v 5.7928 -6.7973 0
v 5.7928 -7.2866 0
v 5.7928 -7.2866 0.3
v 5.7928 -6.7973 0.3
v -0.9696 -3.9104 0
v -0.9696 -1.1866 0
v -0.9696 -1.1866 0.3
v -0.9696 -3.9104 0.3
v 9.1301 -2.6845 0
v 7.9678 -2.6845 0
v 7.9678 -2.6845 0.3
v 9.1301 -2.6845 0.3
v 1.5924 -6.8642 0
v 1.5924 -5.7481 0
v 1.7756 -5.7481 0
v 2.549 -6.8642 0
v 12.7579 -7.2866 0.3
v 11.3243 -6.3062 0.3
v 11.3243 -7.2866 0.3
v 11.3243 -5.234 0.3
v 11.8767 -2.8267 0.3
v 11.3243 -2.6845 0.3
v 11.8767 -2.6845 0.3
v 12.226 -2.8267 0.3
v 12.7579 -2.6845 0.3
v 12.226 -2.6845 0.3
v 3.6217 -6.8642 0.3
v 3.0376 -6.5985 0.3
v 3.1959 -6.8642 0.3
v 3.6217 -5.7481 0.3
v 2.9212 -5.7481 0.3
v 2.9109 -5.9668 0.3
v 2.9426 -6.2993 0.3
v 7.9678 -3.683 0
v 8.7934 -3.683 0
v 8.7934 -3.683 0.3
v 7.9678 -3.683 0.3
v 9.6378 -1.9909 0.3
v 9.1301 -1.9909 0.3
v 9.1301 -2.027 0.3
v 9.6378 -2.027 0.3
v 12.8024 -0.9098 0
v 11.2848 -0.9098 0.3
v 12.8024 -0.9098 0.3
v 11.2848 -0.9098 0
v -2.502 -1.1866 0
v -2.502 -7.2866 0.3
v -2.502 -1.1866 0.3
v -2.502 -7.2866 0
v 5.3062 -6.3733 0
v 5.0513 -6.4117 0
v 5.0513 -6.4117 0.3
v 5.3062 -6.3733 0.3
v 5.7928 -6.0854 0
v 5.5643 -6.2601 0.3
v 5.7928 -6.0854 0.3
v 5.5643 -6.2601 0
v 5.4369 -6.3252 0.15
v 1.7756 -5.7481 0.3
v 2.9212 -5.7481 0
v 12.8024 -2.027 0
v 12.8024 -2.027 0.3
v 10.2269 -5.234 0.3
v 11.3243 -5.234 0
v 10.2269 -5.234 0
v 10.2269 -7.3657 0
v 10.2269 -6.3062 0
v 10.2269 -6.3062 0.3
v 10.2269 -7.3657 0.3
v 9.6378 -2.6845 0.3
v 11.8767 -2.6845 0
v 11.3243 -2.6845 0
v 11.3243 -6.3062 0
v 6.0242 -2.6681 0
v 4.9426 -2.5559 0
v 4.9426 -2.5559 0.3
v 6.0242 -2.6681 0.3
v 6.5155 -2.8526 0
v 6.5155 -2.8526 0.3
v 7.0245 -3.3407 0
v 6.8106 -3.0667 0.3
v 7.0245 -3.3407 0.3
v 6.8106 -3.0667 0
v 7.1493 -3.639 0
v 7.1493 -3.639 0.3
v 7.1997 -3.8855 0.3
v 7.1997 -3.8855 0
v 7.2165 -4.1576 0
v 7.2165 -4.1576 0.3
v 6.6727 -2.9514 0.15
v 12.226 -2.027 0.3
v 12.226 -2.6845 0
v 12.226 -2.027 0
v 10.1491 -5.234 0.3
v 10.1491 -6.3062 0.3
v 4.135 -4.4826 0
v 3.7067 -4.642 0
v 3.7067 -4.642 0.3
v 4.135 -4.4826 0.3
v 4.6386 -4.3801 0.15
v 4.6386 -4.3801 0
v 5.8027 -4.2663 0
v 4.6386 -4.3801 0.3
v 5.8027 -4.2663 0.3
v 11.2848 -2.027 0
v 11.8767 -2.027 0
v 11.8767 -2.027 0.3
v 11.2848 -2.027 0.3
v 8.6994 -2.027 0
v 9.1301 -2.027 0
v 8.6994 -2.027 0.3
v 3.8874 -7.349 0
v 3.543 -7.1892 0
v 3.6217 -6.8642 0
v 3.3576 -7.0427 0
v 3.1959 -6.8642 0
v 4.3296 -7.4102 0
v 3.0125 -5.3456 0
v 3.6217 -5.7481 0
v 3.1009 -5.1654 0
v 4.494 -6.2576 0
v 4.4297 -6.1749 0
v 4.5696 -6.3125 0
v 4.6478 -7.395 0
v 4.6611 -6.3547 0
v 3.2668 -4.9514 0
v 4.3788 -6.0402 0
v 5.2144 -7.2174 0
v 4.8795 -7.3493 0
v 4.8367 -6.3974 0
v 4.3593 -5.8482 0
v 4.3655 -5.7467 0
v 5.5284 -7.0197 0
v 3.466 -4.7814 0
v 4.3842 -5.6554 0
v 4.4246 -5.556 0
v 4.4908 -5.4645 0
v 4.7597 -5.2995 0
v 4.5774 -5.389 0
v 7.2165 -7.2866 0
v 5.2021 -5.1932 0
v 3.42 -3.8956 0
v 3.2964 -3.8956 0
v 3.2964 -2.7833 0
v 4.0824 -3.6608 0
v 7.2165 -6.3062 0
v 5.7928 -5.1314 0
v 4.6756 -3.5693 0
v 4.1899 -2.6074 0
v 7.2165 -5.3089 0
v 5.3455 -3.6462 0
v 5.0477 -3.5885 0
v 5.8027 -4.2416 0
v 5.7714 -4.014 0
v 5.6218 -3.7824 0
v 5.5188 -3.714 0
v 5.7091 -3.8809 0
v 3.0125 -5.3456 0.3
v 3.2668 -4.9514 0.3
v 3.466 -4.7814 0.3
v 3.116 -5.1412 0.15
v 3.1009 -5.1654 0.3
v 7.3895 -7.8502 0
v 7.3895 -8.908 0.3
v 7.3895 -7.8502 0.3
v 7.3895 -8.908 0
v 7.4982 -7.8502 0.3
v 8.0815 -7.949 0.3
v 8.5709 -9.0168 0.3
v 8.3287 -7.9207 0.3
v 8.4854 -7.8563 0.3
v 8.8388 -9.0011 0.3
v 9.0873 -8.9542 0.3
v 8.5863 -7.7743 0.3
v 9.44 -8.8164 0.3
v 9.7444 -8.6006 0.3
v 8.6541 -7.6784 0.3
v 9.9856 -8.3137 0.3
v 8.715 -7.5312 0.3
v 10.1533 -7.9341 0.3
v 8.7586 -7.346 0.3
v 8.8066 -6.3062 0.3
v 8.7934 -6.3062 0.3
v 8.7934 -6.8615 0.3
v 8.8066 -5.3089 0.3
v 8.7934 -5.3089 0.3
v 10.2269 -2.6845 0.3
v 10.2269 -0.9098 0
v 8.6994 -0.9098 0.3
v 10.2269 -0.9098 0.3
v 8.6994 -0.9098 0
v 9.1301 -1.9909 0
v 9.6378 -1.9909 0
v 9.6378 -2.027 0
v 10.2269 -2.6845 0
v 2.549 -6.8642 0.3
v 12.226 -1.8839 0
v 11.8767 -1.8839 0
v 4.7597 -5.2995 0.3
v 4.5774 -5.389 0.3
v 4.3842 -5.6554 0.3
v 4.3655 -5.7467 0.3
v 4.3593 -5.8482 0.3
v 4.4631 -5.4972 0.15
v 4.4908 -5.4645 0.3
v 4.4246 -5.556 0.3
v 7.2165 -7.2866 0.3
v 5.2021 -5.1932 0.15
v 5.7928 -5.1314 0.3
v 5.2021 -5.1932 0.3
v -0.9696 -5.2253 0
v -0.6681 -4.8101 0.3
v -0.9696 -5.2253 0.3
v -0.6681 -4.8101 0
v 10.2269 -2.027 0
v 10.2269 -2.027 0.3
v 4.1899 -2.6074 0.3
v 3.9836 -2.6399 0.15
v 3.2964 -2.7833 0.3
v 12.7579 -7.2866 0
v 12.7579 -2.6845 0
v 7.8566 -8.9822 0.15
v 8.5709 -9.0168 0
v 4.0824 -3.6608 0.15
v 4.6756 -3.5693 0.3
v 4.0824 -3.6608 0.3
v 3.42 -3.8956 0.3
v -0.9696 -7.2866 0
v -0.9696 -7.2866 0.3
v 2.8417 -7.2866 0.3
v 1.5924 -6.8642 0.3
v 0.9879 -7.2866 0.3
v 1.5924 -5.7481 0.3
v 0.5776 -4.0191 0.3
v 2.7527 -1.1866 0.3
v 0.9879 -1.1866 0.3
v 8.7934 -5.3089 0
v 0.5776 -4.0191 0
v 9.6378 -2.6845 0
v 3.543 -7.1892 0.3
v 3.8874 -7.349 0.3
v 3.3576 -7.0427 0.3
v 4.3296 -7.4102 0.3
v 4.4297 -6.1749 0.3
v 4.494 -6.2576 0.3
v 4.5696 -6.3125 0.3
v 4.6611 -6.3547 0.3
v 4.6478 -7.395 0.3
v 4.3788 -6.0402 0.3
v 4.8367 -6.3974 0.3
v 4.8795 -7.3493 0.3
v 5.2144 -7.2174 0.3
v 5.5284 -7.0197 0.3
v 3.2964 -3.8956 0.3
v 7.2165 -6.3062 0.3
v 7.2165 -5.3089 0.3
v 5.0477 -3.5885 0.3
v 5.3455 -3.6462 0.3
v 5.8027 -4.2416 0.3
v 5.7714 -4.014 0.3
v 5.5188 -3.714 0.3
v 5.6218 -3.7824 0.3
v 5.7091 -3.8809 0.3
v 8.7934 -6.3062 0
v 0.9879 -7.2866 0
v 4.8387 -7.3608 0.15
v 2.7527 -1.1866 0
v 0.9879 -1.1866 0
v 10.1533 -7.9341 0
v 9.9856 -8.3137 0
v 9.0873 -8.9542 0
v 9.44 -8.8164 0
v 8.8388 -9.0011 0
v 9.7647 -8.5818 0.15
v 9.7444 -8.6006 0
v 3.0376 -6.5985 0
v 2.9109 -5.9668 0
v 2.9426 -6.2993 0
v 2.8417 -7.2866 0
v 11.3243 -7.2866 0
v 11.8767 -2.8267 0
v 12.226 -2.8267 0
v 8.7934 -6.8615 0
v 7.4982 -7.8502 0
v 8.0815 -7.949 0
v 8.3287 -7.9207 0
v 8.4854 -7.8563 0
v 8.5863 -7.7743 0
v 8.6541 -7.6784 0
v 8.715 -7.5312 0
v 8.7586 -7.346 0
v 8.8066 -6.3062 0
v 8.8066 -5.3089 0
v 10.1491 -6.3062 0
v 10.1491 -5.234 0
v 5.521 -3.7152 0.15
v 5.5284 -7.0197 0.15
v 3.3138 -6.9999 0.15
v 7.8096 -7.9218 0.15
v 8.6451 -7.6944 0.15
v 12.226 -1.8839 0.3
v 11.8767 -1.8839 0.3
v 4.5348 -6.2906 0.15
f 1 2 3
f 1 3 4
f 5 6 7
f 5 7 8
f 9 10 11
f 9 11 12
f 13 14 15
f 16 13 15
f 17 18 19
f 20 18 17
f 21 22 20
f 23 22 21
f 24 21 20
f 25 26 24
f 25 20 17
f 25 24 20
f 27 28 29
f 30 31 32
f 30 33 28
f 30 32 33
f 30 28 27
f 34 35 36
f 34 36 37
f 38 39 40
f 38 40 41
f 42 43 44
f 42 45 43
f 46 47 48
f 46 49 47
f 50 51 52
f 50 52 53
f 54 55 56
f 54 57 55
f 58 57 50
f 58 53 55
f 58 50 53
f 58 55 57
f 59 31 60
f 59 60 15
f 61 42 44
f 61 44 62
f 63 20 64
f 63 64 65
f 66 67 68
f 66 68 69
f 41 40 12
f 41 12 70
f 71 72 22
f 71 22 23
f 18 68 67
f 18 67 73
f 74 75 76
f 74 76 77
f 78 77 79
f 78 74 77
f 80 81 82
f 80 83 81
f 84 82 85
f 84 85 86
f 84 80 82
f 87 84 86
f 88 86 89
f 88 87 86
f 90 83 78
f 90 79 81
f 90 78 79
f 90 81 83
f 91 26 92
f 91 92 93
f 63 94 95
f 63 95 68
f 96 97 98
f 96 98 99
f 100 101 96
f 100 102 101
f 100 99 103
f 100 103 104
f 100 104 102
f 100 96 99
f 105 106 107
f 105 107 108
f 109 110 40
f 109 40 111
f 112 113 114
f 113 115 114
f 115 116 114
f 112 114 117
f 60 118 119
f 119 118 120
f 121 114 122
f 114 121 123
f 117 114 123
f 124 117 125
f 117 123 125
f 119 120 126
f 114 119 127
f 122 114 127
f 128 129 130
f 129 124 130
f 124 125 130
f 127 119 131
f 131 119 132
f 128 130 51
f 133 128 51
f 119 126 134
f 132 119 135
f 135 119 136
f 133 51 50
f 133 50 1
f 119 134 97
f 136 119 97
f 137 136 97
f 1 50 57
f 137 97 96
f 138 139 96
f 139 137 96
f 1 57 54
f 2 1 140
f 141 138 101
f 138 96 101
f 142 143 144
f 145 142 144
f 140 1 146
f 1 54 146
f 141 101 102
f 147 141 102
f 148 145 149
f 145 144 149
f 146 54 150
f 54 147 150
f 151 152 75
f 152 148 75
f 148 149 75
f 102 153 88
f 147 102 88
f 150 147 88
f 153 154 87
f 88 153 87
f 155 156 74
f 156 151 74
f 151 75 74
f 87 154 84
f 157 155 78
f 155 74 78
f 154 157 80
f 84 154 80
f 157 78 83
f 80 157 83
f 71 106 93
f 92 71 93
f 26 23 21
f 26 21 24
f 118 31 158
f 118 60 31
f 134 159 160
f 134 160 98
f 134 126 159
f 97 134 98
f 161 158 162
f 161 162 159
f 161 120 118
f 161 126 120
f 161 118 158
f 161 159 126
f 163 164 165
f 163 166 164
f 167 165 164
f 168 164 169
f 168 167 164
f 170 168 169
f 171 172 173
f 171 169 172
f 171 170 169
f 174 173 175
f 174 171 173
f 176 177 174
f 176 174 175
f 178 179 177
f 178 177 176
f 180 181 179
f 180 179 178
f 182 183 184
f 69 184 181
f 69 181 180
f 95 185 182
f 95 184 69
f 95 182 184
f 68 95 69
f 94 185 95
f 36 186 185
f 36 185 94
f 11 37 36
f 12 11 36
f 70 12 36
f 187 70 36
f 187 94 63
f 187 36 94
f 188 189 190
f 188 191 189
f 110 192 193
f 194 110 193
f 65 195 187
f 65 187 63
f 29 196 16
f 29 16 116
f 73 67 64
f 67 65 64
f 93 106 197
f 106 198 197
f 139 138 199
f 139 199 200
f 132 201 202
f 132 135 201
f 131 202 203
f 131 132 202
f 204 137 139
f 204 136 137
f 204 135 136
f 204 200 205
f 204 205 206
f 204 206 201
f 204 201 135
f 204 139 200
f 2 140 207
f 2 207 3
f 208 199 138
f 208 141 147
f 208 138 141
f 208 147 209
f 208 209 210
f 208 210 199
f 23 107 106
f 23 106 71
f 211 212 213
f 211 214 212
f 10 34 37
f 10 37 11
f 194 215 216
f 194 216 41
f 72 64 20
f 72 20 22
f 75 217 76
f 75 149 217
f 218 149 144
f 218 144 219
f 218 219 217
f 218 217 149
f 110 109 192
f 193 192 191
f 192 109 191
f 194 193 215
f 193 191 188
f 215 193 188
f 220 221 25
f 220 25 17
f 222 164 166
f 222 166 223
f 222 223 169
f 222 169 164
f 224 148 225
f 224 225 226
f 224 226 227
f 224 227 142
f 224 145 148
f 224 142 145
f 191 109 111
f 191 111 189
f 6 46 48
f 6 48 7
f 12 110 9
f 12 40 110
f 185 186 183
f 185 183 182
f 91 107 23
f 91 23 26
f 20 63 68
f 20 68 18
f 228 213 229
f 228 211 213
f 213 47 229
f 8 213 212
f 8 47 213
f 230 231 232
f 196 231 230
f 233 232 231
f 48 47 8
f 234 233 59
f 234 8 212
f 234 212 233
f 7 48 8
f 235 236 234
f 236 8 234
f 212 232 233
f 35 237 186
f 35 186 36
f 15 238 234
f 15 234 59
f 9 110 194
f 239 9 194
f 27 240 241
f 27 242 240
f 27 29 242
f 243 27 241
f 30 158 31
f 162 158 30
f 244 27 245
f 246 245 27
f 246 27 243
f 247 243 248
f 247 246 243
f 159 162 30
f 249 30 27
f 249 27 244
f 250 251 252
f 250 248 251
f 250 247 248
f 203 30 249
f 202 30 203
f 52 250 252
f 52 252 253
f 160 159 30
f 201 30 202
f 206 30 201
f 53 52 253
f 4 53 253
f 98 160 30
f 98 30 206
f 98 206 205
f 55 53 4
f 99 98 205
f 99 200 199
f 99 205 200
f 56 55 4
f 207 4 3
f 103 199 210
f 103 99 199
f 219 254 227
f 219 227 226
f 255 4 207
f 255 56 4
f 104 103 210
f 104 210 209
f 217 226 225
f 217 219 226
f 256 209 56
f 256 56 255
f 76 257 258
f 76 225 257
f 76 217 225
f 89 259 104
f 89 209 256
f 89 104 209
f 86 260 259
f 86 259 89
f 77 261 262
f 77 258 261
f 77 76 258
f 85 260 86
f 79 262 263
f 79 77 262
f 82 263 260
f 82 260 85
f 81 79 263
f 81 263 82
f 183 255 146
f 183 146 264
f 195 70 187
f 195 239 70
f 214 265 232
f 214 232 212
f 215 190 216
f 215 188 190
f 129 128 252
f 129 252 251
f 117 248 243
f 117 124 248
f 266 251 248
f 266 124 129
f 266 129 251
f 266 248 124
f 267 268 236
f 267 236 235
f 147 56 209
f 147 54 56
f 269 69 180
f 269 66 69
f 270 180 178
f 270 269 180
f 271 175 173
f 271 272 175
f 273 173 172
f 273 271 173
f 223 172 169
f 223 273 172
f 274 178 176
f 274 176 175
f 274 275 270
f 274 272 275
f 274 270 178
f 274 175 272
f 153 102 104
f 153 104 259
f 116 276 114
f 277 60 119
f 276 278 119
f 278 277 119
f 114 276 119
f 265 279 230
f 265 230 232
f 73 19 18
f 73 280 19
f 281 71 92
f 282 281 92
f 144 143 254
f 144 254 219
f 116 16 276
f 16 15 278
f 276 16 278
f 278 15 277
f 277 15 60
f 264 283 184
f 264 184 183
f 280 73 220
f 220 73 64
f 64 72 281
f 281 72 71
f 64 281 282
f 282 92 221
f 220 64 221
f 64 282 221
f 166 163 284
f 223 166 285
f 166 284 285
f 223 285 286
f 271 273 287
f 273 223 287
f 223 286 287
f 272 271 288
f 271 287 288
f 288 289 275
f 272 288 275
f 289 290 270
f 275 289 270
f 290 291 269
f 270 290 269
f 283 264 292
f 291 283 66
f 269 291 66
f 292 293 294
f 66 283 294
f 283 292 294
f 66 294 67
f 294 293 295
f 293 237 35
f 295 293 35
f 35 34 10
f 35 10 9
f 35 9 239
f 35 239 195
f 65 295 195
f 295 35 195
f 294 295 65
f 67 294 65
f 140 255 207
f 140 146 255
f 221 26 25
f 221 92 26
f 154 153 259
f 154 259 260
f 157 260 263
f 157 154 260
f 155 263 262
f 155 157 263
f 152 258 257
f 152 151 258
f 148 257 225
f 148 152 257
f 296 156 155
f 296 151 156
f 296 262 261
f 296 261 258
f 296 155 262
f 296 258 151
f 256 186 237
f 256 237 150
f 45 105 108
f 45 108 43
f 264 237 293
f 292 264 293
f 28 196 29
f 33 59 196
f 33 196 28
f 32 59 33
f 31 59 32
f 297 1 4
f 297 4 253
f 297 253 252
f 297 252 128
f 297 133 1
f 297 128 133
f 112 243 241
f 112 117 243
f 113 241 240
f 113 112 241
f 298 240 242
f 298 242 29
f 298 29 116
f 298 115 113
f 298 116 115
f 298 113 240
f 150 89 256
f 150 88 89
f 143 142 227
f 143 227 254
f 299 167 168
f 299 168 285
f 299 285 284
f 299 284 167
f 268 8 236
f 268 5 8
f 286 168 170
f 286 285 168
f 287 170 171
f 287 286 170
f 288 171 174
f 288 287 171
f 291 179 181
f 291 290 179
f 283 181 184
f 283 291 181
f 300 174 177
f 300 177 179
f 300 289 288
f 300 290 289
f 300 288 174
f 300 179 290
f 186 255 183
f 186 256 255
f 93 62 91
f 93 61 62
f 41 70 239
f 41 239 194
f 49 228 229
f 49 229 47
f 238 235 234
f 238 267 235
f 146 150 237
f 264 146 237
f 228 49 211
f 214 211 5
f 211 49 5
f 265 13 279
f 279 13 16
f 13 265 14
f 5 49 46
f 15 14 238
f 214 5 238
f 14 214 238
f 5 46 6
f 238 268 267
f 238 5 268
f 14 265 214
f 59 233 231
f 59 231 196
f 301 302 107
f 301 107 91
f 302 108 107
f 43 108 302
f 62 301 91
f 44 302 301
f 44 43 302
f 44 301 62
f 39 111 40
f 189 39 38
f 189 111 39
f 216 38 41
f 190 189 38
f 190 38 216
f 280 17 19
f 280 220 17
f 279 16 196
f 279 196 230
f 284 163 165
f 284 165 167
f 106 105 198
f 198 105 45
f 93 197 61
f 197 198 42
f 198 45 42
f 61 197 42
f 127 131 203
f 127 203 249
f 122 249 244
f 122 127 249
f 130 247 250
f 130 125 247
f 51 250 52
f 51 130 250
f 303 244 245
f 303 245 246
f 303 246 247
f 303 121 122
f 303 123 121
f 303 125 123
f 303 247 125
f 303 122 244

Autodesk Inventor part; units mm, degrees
ref_plane "YZ Plane" through (0, 0, 0) normal (1, 0, 0) x (0, 1, 0)
ref_plane "XZ Plane" through (0, 0, 0) normal (0, 1, 0) x (-1, 0, 0)
sketch "スケッチ1" plane through (0, 0, 0) normal (0, 0, 1) x (1, 0, 0)
  line L0 (-3.1348, -0.9098) -> (10.2725, -0.9098) construction
  line L1 (10.2725, -0.9098) -> (10.2725, -4.9582) construction
  line L2 (10.2725, -4.9582) -> (-3.1348, -4.9582) construction
  line L3 (-3.1348, -4.9582) -> (-3.1348, -0.9098) construction
  line L4 (2.8417, -7.2866) -> (0.9879, -7.2866)
  line L5 (0.9879, -7.2866) -> (-0.6681, -4.8101)
  line L6 (-0.6681, -4.8101) -> (-0.9696, -5.2253)
  line L7 (-0.9696, -5.2253) -> (-0.9696, -7.2866)
  line L8 (-0.9696, -7.2866) -> (-2.502, -7.2866)
  line L9 (-2.502, -7.2866) -> (-2.502, -1.1866)
  line L10 (-2.502, -1.1866) -> (-0.9696, -1.1866)
  line L11 (-0.9696, -1.1866) -> (-0.9696, -3.9104)
  line L12 (-0.9696, -3.9104) -> (0.9879, -1.1866)
  line L13 (0.9879, -1.1866) -> (2.7527, -1.1866)
  line L14 (2.7527, -1.1866) -> (0.5776, -4.0191)
  line L15 (0.5776, -4.0191) -> (2.8417, -7.2866)
  spline S0 degree 2 poles (5.7928, -6.7973) (5.6445, -6.9208) (5.4122, -7.1186) (5.2144, -7.2174) knots 0 0 0 1 2 2 2
  spline S1 degree 2 poles (5.2144, -7.2174) (5.0216, -7.3114) (4.6558, -7.4102) (4.3296, -7.4102) knots 0 0 0 1 2 2 2
  spline S2 degree 2 poles (4.3296, -7.4102) (3.7166, -7.4102) (2.9109, -6.5896) (2.9109, -5.9668) knots 0 0 0 1 2 2 2
  spline S3 degree 2 poles (2.9109, -5.9668) (2.9109, -5.4576) (3.3212, -4.8249) (3.7067, -4.642) knots 0 0 0 1 2 2 2
  spline S4 degree 2 poles (3.7067, -4.642) (4.0973, -4.4542) (5.1798, -4.3059) (5.8027, -4.2663) knots 0 0 0 1 2 2 2
  line L16 (5.8027, -4.2663) -> (5.8027, -4.2416)
  spline S5 degree 2 poles (5.8027, -4.2416) (5.8027, -3.861) (5.2392, -3.5693) (4.6756, -3.5693) knots 0 0 0 1 2 2 2
  spline S6 degree 2 poles (4.6756, -3.5693) (4.4235, -3.5693) (3.7413, -3.7522) (3.42, -3.8956) knots 0 0 0 1 2 2 2
  line L17 (3.42, -3.8956) -> (3.2964, -3.8956)
  line L18 (3.2964, -3.8956) -> (3.2964, -2.7833)
  spline S7 degree 2 poles (3.2964, -2.7833) (3.509, -2.724) (4.4581, -2.5559) (4.9426, -2.5559) knots 0 0 0 1 2 2 2
  spline S8 degree 2 poles (4.9426, -2.5559) (6.1289, -2.5559) (7.2165, -3.3469) (7.2165, -4.1576) knots 0 0 0 1 2 2 2
  line L19 (7.2165, -4.1576) -> (7.2165, -7.2866)
  line L20 (7.2165, -7.2866) -> (5.7928, -7.2866)
  line L21 (5.7928, -7.2866) -> (5.7928, -6.7973)
  line L22 (5.7928, -6.0854) -> (5.7928, -5.1314)
  spline S9 degree 2 poles (5.7928, -5.1314) (5.427, -5.166) (4.9772, -5.2204) (4.7597, -5.2995) knots 0 0 0 1 2 2 2
  spline S10 degree 2 poles (4.7597, -5.2995) (4.5669, -5.3637) (4.3593, -5.6307) (4.3593, -5.8482) knots 0 0 0 1 2 2 2
  spline S11 degree 2 poles (4.3593, -5.8482) (4.3593, -6.1695) (4.7102, -6.4117) (5.0513, -6.4117) knots 0 0 0 1 2 2 2
  spline S12 degree 2 poles (5.0513, -6.4117) (5.2392, -6.4117) (5.6346, -6.2387) (5.7928, -6.0854) knots 0 0 0 1 2 2 2
  spline S13 degree 2 poles (10.2269, -7.3657) (10.2269, -8.1468) (9.3025, -9.0168) (8.5709, -9.0168) knots 0 0 0 1 2 2 2
  spline S14 degree 2 poles (8.5709, -9.0168) (8.1755, -9.0168) (7.5378, -8.9476) (7.3895, -8.908) knots 0 0 0 1 2 2 2
  line L23 (7.3895, -8.908) -> (7.3895, -7.8502)
  line L24 (7.3895, -7.8502) -> (7.4982, -7.8502)
  spline S15 degree 2 poles (7.4982, -7.8502) (7.6416, -7.8947) (7.9777, -7.949) (8.0815, -7.949) knots 0 0 0 1 2 2 2
  spline S16 degree 2 poles (8.0815, -7.949) (8.4968, -7.949) (8.7934, -7.4399) (8.7934, -6.8615) knots 0 0 0 1 2 2 2
  line L25 (8.7934, -6.8615) -> (8.7934, -3.683)
  line L26 (8.7934, -3.683) -> (7.9678, -3.683)
  line L27 (7.9678, -3.683) -> (7.9678, -2.6845)
  line L28 (7.9678, -2.6845) -> (10.2269, -2.6845)
  line L29 (10.2269, -2.6845) -> (10.2269, -7.3657)
  line L30 (10.2269, -2.027) -> (8.6994, -2.027)
  line L31 (8.6994, -2.027) -> (8.6994, -0.9098)
  line L32 (8.6994, -0.9098) -> (10.2269, -0.9098)
  line L33 (10.2269, -0.9098) -> (10.2269, -2.027)
  line L34 (12.7579, -7.2866) -> (11.3243, -7.2866)
  line L35 (11.3243, -7.2866) -> (11.3243, -2.6845)
  line L36 (11.3243, -2.6845) -> (12.7579, -2.6845)
  line L37 (12.7579, -2.6845) -> (12.7579, -7.2866)
  line L38 (12.8024, -2.027) -> (11.2848, -2.027)
  line L39 (11.2848, -2.027) -> (11.2848, -0.9098)
  line L40 (11.2848, -0.9098) -> (12.8024, -0.9098)
  line L41 (12.8024, -0.9098) -> (12.8024, -2.027)
  point P0 (0, 0)
extrude "押し出し1" add sketch "スケッチ1" along normal blind 0.3
ref_plane "作業平面1" through (0, 0, 0.3) normal (0, 0, 1) x (1, 0, 0)
sketch "スケッチ4" plane through (0, 0, 0.3) normal (0, 0, 1) x (1, 0, 0)
  line L0 (12.7579, -7.2866) -> (12.7579, -2.6845) projected
  line L1 (-2.502, -1.1866) -> (-2.502, -7.2866) projected
  line L2 (1.5924, -6.8642) -> (3.6217, -6.8642)
  line L3 (3.6217, -6.8642) -> (3.6217, -5.7481)
  line L4 (3.6217, -5.7481) -> (1.5924, -5.7481)
  line L5 (1.5924, -5.7481) -> (1.5924, -6.8642)
  line L6 (7.2165, -7.2866) -> (7.2165, -4.1576) projected
  line L7 (7.2165, -6.3062) -> (8.8066, -6.3062)
  line L8 (8.8066, -6.3062) -> (8.8066, -5.3089)
  line L9 (8.8066, -5.3089) -> (7.2165, -5.3089)
  line L10 (7.2165, -5.3089) -> (7.2165, -6.3062)
  line L11 (11.3243, -2.6845) -> (11.3243, -7.2866) projected
  line L12 (10.1491, -6.3062) -> (11.3243, -6.3062)
  line L13 (11.3243, -6.3062) -> (11.3243, -5.234)
  line L14 (11.3243, -5.234) -> (10.1491, -5.234)
  line L15 (10.1491, -5.234) -> (10.1491, -6.3062)
  line L16 (9.1301, -2.6845) -> (9.6378, -2.6845)
  line L17 (9.6378, -2.6845) -> (9.6378, -1.9909)
  line L18 (9.6378, -1.9909) -> (9.1301, -1.9909)
  line L19 (9.1301, -1.9909) -> (9.1301, -2.6845)
  line L20 (11.8767, -2.8267) -> (12.226, -2.8267)
  line L21 (12.226, -2.8267) -> (12.226, -1.8839)
  line L22 (12.226, -1.8839) -> (11.8767, -1.8839)
  line L23 (11.8767, -1.8839) -> (11.8767, -2.8267)
  point P0 (0, 0)
  dimension "d6" = 15.2599
extrude "押し出し3" add sketch "スケッチ4" against normal blind 0.3 contours L5 L4 L3 L2 | L6 L9 L8 L7 | L11 L12 L15 L14
extrude "押し出し4" add sketch "スケッチ4" against normal blind 0.3 contours L19 L18 L17 L16 | L23 L22 L21 L20
properties part number "photon_sample"
